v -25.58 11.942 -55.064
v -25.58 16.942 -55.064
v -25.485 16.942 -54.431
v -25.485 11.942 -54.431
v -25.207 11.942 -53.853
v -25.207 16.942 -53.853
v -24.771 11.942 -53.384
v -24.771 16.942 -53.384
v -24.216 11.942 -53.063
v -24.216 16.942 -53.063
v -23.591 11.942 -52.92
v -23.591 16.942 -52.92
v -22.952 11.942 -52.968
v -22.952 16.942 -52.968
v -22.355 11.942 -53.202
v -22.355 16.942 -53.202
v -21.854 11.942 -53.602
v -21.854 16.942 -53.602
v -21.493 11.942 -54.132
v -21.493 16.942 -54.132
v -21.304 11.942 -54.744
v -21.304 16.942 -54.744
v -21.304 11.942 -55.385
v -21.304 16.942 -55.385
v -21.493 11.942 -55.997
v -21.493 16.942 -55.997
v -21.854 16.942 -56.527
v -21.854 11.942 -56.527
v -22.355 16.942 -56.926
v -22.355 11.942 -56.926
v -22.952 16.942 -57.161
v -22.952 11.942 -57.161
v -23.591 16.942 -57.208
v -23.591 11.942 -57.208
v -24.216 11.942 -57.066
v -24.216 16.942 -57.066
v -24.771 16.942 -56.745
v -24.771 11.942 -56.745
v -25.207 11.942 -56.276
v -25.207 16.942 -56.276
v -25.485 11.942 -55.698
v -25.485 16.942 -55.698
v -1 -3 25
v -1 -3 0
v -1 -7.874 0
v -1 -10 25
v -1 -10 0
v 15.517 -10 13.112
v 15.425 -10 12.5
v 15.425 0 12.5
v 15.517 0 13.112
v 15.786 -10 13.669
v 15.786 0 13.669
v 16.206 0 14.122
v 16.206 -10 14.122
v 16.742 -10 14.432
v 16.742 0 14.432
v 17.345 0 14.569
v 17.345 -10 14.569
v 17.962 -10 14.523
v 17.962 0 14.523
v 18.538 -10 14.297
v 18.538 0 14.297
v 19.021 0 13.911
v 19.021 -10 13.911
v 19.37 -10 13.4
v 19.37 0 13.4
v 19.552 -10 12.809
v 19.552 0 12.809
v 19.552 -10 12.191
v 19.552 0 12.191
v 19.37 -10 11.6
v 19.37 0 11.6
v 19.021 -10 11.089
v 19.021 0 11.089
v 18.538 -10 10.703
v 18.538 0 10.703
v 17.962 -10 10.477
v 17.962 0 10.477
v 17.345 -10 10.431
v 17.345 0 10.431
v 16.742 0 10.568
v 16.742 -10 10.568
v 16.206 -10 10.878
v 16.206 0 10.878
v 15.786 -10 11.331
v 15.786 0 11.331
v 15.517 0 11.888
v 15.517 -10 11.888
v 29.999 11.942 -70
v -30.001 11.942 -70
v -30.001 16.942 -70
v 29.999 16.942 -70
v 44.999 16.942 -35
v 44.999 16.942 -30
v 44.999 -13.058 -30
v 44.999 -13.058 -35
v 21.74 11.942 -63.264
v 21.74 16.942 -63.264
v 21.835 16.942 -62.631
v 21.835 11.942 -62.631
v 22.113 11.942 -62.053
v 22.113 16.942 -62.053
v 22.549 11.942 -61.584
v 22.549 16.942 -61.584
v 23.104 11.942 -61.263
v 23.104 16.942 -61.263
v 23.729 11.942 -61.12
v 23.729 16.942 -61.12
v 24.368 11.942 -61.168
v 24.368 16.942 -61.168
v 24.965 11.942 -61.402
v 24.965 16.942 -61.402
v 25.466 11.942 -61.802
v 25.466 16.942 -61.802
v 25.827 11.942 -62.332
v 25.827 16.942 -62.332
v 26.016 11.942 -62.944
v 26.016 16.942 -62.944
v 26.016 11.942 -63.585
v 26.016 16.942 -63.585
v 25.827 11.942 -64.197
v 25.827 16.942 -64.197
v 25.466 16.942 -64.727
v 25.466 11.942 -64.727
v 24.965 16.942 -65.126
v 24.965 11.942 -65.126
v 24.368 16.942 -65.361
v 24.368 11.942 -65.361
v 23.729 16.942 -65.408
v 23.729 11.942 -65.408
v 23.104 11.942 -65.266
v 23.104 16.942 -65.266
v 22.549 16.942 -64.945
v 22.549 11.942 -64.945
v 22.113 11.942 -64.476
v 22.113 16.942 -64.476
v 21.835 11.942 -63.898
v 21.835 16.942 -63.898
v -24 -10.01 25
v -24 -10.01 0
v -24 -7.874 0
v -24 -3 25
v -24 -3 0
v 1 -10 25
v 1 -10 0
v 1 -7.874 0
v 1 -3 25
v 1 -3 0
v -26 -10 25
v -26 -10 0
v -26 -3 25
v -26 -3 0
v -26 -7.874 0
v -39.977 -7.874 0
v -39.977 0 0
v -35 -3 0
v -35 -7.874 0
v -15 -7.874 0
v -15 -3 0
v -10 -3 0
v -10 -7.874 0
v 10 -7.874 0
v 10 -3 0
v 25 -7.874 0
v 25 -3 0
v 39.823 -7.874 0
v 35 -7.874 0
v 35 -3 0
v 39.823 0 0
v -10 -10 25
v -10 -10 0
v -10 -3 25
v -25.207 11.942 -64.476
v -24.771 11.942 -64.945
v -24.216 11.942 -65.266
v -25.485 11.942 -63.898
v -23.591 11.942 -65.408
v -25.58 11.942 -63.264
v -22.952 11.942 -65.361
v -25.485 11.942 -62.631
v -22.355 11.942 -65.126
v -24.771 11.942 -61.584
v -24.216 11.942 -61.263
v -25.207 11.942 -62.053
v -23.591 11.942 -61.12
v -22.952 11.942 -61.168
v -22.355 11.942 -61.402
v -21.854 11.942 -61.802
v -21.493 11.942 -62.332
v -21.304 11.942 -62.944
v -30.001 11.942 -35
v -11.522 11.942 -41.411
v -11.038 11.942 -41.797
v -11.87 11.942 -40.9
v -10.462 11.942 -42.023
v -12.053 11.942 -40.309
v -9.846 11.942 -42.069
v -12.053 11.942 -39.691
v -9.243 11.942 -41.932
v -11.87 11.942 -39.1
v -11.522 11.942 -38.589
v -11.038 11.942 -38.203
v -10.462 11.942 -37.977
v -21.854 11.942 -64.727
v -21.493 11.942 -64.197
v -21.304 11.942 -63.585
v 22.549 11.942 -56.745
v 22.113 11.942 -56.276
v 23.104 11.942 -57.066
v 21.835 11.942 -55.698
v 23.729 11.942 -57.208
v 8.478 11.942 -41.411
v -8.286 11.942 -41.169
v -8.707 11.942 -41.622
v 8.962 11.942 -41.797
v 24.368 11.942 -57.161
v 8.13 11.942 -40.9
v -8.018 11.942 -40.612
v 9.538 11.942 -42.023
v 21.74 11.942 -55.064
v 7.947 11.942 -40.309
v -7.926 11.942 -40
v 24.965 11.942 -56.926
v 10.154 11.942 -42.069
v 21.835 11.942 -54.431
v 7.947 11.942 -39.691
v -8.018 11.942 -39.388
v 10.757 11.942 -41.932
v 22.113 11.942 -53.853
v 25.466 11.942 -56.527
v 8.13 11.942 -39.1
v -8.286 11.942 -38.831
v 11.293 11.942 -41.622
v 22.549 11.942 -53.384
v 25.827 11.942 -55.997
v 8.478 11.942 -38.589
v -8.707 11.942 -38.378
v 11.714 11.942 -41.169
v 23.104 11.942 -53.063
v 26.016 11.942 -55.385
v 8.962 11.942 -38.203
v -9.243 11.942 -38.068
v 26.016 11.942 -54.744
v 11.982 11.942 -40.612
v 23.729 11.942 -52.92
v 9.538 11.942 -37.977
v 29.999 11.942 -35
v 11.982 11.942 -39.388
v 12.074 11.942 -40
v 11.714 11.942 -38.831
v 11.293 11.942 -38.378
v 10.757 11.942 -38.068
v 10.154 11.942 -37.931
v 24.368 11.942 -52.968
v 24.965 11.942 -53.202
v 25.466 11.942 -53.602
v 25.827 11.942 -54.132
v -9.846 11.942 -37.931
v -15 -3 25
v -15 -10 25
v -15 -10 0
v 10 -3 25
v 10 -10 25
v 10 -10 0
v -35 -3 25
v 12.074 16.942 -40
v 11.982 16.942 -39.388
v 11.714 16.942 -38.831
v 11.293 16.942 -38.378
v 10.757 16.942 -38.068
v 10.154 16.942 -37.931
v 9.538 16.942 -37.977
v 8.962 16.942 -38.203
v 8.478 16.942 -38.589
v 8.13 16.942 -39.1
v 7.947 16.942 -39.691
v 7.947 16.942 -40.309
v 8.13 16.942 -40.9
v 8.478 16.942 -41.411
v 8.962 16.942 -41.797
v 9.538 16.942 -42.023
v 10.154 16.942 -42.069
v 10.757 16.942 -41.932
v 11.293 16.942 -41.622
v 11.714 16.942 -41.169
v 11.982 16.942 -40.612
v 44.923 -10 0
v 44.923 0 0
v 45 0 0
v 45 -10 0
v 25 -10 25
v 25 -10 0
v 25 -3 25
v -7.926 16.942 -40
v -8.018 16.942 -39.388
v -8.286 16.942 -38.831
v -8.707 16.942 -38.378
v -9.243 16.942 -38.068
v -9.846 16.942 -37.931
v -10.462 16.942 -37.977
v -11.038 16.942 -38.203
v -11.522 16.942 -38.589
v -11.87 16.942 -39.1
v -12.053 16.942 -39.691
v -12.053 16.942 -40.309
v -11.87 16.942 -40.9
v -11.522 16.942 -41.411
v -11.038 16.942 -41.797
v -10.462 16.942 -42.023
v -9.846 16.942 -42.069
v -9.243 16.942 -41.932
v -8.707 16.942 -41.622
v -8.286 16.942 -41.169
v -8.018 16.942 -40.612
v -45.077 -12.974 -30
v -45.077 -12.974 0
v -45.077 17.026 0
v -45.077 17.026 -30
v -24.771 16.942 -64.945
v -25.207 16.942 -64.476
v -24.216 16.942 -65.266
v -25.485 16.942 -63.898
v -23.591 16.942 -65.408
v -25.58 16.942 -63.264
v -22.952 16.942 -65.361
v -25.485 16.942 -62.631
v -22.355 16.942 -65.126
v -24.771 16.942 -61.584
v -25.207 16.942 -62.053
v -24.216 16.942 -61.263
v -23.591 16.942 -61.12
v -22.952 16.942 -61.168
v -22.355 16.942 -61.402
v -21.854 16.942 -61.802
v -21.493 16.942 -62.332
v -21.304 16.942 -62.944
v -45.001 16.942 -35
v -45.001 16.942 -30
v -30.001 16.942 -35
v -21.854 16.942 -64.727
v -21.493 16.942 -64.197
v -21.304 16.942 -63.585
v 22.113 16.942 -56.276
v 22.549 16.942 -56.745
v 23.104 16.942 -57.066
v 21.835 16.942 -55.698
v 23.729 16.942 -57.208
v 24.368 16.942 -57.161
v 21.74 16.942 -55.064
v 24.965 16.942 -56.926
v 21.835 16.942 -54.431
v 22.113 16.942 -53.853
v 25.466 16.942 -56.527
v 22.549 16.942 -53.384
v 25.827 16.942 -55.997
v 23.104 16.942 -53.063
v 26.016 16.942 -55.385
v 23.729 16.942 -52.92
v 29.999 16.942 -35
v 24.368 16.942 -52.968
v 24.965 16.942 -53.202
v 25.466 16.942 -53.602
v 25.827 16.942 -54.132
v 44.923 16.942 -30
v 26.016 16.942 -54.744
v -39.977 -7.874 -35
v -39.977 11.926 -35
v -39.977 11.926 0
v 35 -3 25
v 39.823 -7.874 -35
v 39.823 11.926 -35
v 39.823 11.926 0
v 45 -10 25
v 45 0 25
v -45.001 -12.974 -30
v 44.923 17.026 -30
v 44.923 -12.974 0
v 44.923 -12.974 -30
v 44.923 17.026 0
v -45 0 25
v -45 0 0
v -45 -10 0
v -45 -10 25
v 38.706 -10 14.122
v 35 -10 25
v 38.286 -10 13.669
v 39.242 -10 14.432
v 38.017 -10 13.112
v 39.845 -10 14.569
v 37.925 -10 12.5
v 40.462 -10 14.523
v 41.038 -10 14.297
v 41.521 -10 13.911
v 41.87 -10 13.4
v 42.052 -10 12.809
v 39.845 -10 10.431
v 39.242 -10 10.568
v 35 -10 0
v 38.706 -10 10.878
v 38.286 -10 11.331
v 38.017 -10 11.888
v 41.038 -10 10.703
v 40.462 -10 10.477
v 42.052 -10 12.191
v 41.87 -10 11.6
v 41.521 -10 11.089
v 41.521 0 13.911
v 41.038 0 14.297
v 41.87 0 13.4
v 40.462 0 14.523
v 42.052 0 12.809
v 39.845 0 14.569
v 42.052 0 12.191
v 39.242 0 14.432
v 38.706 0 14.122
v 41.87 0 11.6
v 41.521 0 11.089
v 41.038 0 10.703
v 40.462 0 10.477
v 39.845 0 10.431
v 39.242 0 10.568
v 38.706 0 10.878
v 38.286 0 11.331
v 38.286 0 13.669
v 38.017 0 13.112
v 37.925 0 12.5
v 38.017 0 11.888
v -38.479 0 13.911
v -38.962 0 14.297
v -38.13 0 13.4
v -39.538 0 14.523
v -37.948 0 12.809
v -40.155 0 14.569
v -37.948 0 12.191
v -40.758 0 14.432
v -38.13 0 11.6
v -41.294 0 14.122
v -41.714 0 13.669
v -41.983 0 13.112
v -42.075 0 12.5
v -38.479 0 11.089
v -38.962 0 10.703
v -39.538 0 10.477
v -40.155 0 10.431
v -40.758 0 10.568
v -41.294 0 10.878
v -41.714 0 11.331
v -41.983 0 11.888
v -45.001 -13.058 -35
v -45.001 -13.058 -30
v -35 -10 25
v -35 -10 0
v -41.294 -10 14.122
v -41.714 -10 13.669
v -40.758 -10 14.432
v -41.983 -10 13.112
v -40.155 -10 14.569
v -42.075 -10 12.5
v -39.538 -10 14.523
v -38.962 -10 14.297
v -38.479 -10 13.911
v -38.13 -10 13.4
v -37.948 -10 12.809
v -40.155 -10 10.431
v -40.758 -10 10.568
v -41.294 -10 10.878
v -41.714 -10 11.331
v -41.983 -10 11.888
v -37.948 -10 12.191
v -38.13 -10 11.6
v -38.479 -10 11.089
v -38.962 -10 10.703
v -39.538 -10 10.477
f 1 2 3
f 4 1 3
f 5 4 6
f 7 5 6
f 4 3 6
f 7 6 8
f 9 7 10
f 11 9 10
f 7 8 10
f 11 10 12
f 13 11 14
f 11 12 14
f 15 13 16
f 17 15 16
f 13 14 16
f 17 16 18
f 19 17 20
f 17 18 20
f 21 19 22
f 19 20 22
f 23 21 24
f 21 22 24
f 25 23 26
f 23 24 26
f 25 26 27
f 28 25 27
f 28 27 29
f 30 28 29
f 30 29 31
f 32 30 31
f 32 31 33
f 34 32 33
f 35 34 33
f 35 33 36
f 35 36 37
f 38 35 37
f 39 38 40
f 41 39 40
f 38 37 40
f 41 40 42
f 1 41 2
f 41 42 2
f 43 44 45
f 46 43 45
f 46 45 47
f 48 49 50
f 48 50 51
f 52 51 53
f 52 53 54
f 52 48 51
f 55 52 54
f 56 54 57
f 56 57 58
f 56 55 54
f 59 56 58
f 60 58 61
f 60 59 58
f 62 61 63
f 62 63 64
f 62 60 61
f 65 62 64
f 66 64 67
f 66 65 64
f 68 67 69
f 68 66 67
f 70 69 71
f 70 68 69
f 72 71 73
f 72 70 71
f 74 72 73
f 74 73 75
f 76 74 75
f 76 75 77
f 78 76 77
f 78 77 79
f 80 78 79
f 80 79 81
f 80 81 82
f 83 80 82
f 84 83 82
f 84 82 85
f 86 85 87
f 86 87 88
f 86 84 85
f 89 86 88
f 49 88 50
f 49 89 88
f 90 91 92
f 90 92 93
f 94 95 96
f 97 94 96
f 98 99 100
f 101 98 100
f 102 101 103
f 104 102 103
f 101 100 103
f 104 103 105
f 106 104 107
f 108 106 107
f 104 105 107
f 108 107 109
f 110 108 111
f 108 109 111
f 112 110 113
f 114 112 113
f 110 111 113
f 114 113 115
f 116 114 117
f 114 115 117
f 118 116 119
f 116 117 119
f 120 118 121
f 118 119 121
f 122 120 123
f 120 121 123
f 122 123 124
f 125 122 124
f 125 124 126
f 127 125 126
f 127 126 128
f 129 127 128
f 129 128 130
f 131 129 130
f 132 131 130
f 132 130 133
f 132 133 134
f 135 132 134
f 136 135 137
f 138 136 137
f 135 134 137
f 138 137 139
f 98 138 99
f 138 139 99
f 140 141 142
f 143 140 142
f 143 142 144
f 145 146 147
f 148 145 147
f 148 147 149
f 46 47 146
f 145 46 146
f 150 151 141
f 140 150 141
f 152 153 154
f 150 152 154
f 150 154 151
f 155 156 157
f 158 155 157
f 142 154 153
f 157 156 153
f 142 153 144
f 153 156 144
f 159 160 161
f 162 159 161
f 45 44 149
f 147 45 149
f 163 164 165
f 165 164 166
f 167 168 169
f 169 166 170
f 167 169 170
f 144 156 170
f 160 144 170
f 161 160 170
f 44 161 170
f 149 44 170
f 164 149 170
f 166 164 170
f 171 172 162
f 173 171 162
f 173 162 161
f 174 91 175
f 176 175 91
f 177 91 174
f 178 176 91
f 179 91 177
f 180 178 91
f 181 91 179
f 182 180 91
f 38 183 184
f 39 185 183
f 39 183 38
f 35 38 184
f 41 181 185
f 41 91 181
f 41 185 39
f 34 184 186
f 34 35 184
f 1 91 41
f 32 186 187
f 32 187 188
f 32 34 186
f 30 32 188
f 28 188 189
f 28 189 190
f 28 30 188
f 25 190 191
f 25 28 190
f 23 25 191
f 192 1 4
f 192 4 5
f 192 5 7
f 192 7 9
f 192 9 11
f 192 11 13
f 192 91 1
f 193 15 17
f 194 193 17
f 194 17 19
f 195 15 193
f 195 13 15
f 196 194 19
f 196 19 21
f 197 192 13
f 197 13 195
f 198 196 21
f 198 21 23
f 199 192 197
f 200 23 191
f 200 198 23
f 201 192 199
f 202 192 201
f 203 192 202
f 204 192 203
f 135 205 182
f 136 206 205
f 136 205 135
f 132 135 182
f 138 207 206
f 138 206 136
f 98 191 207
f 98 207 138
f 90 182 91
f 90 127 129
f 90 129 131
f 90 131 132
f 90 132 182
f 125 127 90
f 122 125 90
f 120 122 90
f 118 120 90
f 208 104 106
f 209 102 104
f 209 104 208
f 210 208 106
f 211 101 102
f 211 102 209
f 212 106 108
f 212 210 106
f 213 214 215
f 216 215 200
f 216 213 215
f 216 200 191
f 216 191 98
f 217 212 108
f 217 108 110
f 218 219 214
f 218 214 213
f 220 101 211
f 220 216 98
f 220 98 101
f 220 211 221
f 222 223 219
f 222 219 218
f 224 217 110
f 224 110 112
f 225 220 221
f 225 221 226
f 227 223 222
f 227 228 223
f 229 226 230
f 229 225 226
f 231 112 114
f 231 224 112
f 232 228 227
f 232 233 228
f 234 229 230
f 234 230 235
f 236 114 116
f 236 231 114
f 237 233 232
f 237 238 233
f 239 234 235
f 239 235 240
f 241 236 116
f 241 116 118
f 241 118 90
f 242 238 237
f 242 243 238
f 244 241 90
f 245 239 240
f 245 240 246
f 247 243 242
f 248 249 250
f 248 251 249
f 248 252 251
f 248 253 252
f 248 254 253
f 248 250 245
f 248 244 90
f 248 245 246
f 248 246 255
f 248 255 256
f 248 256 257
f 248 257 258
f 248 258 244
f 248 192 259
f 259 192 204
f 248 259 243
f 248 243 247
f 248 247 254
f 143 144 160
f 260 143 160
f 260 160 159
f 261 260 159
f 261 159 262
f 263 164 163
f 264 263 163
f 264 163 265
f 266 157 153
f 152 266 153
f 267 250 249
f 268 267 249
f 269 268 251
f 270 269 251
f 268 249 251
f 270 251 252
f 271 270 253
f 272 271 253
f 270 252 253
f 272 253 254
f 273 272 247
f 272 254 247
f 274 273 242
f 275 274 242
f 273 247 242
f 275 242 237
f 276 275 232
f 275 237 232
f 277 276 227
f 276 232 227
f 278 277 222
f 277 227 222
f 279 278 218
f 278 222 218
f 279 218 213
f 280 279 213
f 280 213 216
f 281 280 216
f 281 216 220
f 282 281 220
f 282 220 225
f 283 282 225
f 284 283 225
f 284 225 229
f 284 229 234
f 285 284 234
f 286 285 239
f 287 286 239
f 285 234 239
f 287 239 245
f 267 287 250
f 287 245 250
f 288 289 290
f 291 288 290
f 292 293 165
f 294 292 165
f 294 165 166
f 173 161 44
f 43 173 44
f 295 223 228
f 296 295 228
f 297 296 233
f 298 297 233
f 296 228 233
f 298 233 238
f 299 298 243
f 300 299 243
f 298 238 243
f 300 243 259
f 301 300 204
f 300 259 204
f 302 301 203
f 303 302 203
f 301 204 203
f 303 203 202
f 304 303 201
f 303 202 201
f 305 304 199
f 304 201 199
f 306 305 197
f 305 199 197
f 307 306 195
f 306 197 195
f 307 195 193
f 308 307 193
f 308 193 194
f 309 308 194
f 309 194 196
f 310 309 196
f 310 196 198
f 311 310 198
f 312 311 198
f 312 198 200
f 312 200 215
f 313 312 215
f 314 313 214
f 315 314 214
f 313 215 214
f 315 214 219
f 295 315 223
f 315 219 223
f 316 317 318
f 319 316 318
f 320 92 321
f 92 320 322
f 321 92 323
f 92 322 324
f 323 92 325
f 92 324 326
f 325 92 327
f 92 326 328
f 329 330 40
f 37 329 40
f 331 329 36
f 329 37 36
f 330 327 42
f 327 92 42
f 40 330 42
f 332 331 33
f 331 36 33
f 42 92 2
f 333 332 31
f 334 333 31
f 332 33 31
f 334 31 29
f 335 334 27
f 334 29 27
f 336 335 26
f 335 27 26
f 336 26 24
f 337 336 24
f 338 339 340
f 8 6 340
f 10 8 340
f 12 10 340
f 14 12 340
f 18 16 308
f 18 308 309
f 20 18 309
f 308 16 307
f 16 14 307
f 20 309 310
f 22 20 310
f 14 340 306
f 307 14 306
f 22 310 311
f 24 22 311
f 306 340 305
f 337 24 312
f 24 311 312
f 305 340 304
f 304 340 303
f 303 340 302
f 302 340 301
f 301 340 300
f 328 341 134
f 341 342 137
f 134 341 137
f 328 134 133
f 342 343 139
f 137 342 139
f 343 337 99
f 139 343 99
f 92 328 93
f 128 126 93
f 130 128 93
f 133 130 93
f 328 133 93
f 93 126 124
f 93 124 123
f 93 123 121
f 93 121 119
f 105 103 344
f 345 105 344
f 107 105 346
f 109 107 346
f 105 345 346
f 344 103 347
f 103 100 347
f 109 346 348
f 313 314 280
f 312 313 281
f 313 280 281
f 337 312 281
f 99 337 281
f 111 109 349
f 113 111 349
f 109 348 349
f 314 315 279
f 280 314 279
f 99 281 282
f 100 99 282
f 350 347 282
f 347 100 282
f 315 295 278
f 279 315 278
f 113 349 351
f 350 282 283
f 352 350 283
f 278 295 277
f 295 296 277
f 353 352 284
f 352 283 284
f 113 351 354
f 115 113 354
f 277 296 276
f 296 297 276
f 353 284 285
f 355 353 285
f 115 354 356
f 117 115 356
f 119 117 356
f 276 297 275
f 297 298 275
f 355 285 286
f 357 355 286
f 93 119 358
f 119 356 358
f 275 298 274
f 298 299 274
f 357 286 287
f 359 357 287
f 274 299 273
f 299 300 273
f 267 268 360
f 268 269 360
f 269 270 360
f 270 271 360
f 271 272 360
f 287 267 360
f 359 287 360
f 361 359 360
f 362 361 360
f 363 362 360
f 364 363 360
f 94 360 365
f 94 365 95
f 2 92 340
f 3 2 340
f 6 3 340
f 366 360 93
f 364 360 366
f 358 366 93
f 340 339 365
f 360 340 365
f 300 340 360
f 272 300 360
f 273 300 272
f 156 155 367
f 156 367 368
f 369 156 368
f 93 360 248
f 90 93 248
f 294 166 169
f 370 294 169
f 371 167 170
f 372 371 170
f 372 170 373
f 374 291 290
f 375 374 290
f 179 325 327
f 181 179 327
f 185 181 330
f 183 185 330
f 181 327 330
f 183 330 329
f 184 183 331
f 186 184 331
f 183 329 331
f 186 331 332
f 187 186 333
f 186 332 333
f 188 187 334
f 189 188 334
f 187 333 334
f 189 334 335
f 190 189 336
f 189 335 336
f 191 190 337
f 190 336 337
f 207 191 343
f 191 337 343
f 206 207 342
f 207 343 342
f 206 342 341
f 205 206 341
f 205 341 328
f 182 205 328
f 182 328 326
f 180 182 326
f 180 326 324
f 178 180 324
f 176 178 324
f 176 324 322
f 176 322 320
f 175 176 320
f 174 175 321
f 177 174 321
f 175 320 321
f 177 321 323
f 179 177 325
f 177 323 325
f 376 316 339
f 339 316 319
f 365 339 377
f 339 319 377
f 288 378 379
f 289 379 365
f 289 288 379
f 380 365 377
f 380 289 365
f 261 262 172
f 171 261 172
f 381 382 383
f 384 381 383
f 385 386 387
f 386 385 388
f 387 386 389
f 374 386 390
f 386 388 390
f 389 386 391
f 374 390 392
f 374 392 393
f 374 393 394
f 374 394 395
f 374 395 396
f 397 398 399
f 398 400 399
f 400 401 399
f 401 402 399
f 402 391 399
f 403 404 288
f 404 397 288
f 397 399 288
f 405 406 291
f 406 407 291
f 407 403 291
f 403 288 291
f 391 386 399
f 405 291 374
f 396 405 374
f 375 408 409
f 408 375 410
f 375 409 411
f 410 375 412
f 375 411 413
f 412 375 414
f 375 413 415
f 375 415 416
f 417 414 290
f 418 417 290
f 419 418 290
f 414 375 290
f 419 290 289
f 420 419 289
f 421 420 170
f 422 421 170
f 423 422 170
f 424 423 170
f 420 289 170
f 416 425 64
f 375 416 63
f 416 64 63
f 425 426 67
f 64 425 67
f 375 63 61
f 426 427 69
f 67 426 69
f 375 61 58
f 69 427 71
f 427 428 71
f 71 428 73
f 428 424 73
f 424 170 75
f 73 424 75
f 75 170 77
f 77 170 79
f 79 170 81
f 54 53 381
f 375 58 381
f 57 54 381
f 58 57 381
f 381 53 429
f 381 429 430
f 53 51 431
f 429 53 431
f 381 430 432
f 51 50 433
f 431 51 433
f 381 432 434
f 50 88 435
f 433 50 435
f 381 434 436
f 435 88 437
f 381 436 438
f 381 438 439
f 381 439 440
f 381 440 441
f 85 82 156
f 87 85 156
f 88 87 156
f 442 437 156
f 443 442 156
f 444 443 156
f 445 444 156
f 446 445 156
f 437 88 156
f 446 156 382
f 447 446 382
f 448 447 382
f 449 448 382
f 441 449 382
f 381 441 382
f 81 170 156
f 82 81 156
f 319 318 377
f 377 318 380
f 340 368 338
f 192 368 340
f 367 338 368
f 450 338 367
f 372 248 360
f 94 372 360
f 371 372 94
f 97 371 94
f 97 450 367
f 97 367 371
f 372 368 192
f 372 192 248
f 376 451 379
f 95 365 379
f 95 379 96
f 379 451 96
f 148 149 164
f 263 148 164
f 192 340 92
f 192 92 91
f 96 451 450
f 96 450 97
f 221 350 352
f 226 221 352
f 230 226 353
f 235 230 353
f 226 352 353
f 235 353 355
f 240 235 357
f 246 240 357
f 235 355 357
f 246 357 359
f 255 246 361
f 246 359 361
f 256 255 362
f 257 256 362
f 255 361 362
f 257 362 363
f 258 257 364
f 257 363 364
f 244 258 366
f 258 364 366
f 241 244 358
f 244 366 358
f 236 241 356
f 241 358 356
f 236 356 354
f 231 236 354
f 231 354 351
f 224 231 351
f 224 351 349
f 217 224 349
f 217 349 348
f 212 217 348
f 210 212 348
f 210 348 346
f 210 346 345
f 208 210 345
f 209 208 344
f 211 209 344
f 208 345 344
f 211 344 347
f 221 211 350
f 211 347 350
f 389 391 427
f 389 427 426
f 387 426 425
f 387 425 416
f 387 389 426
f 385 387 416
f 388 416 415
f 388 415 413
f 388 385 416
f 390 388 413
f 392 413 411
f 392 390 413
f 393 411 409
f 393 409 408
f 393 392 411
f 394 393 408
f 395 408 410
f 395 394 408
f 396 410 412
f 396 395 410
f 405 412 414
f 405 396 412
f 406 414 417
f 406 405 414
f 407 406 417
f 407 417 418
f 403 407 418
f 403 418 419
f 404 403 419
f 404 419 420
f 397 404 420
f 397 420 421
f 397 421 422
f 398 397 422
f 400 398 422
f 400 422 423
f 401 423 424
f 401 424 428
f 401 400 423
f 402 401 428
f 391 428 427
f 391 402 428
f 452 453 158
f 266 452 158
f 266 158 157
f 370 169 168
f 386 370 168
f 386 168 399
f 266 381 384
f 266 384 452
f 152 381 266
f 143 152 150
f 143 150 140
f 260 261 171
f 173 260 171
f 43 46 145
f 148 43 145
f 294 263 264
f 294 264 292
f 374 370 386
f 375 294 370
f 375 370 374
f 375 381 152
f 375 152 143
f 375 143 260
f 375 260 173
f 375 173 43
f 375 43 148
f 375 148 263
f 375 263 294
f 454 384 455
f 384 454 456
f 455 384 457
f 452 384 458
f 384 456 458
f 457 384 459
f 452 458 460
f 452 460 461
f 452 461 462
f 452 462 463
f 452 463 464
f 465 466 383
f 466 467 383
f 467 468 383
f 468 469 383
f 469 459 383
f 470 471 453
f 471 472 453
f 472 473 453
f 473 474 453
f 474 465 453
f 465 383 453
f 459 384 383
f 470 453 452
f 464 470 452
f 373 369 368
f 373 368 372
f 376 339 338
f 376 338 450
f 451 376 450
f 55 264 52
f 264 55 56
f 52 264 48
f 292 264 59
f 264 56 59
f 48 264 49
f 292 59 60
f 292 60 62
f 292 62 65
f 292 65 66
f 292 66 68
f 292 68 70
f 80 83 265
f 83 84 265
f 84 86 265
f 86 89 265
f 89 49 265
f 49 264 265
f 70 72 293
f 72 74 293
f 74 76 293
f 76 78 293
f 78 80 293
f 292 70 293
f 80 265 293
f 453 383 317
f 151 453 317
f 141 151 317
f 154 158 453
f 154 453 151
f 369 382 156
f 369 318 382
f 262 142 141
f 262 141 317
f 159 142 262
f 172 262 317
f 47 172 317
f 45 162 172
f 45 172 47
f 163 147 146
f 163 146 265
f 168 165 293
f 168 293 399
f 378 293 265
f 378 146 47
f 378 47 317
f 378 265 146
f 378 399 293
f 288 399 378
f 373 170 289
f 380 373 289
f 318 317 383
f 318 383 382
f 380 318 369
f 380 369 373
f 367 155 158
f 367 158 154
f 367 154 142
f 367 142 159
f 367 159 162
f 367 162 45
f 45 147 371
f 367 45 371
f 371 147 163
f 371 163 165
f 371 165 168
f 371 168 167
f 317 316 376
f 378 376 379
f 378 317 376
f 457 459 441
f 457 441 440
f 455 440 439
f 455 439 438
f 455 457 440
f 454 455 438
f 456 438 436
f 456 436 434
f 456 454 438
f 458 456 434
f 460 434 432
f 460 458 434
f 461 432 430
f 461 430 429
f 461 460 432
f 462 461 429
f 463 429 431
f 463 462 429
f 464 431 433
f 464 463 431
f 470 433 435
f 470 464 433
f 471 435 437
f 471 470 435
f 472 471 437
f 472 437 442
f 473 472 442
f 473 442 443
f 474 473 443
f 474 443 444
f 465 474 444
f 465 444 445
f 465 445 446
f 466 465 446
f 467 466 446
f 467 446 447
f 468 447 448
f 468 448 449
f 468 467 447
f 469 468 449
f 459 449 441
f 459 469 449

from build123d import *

# Parameters (mm, degrees)
F1_DEPTH  = 25
F2_W      = 90
F2_H      = 30
F2_W_2    = 79.8000005633
F2_H_2    = 19.8000005633
F3_DEPTH  = 30
F5_W      = 90
F5_H      = 30
F6_DEPTH  = 5
F7_W      = 60
F7_H      = 5
F8_DEPTH  = 35
F9_R      = 2.075
F10_DEPTH = 5
F12_R     = 2.075
F13_DEPTH = 10
F15_R     = 2.15
F16_DEPTH = 5
F17_DEPTH = 35


with BuildPart() as f1:
    # F0 (on Top) → F1 (new body)
    with BuildSketch(Plane.XY):
        Polygon((-20, 0), (-45, 0), (-45, -10), (-35, -10), (-35, -3), (-26, -3), (-26, -10), (-24, -10.0096508846), (-24, -3), (-15, -3), (-15, -10), (-10, -10), (-10, -3), (-1, -3), (-1, -10), (1, -10), (1, -3), (10, -3), (10, -10), (25, -10), (25, -3), (35, -3), (35, -10), (45, -10), (45, 0), (20, 0), align=None)
    extrude(amount=F1_DEPTH)

    # F2 (on Top) → F3 (join)
    with BuildSketch(Plane.XY):
        with Locations((-0.0773276389, 2.026154995)):
            Rectangle(F2_W, F2_H)
        with Locations((-0.0773276389, 2.026154995)):
            Rectangle(F2_W_2, F2_H_2, mode=Mode.SUBTRACT)
    extrude(amount=-F3_DEPTH)

    # F5 (on offset) → F6 (join)
    with BuildSketch(Plane(origin=(0, 0, -30), x_dir=(1, 0, 0), z_dir=(0, 0, -1))):
        with Locations((-0.0007246435, -1.9418361038)):
            Rectangle(F5_W, F5_H)
    extrude(amount=F6_DEPTH)

    # F7 (on face) → F8 (join)
    with BuildSketch(Plane(origin=(0, 0, -35), x_dir=(1, 0, 0), z_dir=(0, 0, -1))):
        with Locations((-0.0007246435, -14.4418361038)):
            Rectangle(F7_W, F7_H)
    extrude(amount=F8_DEPTH)

    # F9 (on face) → F10 (cut, through all)
    with BuildSketch(Plane.XZ.offset(-11.9418361038)):
        with Locations((-10.0007246435, -40)):
            Circle(F9_R)
        with Locations((9.9992753565, -40)):
            Circle(F9_R)
    extrude(amount=-F10_DEPTH, mode=Mode.SUBTRACT)

    # F12 (on offset) → F13 (cut, through all)
    with BuildSketch(Plane(origin=(0, -10, 0), x_dir=(-1, 0, 0), z_dir=(0, 1, 0))):
        with Locations((40, 12.5)):
            Circle(F12_R)
        with Locations((-17.5, 12.5)):
            Circle(F12_R)
        with Locations((-40, 12.5)):
            Circle(F12_R)
    extrude(amount=F13_DEPTH, mode=Mode.SUBTRACT)

    # F15 (on offset) → F16 (cut, through all)
    with BuildSketch(Plane(origin=(0, 16.9418361038, 0), x_dir=(-1, 0, 0), z_dir=(0, 1, 0))):
        with Locations((23.4303546713, -55.0644522592)):
            Circle(F15_R)
        with Locations((-23.8896453287, -55.0644522592)):
            Circle(F15_R)
        with Locations((-23.8896453287, -63.2644522592)):
            Circle(F15_R)
        with Locations((23.4303546713, -63.2644522592)):
            Circle(F15_R)
    extrude(amount=-F16_DEPTH, mode=Mode.SUBTRACT)

    # F2 (on Top) → F17 (cut)
    with BuildSketch(Plane.XY):
        with Locations((-0.0773276389, 2.026154995)):
            Rectangle(F2_W_2, F2_H_2)
    extrude(amount=-F17_DEPTH, mode=Mode.SUBTRACT)


solid = f1.part
